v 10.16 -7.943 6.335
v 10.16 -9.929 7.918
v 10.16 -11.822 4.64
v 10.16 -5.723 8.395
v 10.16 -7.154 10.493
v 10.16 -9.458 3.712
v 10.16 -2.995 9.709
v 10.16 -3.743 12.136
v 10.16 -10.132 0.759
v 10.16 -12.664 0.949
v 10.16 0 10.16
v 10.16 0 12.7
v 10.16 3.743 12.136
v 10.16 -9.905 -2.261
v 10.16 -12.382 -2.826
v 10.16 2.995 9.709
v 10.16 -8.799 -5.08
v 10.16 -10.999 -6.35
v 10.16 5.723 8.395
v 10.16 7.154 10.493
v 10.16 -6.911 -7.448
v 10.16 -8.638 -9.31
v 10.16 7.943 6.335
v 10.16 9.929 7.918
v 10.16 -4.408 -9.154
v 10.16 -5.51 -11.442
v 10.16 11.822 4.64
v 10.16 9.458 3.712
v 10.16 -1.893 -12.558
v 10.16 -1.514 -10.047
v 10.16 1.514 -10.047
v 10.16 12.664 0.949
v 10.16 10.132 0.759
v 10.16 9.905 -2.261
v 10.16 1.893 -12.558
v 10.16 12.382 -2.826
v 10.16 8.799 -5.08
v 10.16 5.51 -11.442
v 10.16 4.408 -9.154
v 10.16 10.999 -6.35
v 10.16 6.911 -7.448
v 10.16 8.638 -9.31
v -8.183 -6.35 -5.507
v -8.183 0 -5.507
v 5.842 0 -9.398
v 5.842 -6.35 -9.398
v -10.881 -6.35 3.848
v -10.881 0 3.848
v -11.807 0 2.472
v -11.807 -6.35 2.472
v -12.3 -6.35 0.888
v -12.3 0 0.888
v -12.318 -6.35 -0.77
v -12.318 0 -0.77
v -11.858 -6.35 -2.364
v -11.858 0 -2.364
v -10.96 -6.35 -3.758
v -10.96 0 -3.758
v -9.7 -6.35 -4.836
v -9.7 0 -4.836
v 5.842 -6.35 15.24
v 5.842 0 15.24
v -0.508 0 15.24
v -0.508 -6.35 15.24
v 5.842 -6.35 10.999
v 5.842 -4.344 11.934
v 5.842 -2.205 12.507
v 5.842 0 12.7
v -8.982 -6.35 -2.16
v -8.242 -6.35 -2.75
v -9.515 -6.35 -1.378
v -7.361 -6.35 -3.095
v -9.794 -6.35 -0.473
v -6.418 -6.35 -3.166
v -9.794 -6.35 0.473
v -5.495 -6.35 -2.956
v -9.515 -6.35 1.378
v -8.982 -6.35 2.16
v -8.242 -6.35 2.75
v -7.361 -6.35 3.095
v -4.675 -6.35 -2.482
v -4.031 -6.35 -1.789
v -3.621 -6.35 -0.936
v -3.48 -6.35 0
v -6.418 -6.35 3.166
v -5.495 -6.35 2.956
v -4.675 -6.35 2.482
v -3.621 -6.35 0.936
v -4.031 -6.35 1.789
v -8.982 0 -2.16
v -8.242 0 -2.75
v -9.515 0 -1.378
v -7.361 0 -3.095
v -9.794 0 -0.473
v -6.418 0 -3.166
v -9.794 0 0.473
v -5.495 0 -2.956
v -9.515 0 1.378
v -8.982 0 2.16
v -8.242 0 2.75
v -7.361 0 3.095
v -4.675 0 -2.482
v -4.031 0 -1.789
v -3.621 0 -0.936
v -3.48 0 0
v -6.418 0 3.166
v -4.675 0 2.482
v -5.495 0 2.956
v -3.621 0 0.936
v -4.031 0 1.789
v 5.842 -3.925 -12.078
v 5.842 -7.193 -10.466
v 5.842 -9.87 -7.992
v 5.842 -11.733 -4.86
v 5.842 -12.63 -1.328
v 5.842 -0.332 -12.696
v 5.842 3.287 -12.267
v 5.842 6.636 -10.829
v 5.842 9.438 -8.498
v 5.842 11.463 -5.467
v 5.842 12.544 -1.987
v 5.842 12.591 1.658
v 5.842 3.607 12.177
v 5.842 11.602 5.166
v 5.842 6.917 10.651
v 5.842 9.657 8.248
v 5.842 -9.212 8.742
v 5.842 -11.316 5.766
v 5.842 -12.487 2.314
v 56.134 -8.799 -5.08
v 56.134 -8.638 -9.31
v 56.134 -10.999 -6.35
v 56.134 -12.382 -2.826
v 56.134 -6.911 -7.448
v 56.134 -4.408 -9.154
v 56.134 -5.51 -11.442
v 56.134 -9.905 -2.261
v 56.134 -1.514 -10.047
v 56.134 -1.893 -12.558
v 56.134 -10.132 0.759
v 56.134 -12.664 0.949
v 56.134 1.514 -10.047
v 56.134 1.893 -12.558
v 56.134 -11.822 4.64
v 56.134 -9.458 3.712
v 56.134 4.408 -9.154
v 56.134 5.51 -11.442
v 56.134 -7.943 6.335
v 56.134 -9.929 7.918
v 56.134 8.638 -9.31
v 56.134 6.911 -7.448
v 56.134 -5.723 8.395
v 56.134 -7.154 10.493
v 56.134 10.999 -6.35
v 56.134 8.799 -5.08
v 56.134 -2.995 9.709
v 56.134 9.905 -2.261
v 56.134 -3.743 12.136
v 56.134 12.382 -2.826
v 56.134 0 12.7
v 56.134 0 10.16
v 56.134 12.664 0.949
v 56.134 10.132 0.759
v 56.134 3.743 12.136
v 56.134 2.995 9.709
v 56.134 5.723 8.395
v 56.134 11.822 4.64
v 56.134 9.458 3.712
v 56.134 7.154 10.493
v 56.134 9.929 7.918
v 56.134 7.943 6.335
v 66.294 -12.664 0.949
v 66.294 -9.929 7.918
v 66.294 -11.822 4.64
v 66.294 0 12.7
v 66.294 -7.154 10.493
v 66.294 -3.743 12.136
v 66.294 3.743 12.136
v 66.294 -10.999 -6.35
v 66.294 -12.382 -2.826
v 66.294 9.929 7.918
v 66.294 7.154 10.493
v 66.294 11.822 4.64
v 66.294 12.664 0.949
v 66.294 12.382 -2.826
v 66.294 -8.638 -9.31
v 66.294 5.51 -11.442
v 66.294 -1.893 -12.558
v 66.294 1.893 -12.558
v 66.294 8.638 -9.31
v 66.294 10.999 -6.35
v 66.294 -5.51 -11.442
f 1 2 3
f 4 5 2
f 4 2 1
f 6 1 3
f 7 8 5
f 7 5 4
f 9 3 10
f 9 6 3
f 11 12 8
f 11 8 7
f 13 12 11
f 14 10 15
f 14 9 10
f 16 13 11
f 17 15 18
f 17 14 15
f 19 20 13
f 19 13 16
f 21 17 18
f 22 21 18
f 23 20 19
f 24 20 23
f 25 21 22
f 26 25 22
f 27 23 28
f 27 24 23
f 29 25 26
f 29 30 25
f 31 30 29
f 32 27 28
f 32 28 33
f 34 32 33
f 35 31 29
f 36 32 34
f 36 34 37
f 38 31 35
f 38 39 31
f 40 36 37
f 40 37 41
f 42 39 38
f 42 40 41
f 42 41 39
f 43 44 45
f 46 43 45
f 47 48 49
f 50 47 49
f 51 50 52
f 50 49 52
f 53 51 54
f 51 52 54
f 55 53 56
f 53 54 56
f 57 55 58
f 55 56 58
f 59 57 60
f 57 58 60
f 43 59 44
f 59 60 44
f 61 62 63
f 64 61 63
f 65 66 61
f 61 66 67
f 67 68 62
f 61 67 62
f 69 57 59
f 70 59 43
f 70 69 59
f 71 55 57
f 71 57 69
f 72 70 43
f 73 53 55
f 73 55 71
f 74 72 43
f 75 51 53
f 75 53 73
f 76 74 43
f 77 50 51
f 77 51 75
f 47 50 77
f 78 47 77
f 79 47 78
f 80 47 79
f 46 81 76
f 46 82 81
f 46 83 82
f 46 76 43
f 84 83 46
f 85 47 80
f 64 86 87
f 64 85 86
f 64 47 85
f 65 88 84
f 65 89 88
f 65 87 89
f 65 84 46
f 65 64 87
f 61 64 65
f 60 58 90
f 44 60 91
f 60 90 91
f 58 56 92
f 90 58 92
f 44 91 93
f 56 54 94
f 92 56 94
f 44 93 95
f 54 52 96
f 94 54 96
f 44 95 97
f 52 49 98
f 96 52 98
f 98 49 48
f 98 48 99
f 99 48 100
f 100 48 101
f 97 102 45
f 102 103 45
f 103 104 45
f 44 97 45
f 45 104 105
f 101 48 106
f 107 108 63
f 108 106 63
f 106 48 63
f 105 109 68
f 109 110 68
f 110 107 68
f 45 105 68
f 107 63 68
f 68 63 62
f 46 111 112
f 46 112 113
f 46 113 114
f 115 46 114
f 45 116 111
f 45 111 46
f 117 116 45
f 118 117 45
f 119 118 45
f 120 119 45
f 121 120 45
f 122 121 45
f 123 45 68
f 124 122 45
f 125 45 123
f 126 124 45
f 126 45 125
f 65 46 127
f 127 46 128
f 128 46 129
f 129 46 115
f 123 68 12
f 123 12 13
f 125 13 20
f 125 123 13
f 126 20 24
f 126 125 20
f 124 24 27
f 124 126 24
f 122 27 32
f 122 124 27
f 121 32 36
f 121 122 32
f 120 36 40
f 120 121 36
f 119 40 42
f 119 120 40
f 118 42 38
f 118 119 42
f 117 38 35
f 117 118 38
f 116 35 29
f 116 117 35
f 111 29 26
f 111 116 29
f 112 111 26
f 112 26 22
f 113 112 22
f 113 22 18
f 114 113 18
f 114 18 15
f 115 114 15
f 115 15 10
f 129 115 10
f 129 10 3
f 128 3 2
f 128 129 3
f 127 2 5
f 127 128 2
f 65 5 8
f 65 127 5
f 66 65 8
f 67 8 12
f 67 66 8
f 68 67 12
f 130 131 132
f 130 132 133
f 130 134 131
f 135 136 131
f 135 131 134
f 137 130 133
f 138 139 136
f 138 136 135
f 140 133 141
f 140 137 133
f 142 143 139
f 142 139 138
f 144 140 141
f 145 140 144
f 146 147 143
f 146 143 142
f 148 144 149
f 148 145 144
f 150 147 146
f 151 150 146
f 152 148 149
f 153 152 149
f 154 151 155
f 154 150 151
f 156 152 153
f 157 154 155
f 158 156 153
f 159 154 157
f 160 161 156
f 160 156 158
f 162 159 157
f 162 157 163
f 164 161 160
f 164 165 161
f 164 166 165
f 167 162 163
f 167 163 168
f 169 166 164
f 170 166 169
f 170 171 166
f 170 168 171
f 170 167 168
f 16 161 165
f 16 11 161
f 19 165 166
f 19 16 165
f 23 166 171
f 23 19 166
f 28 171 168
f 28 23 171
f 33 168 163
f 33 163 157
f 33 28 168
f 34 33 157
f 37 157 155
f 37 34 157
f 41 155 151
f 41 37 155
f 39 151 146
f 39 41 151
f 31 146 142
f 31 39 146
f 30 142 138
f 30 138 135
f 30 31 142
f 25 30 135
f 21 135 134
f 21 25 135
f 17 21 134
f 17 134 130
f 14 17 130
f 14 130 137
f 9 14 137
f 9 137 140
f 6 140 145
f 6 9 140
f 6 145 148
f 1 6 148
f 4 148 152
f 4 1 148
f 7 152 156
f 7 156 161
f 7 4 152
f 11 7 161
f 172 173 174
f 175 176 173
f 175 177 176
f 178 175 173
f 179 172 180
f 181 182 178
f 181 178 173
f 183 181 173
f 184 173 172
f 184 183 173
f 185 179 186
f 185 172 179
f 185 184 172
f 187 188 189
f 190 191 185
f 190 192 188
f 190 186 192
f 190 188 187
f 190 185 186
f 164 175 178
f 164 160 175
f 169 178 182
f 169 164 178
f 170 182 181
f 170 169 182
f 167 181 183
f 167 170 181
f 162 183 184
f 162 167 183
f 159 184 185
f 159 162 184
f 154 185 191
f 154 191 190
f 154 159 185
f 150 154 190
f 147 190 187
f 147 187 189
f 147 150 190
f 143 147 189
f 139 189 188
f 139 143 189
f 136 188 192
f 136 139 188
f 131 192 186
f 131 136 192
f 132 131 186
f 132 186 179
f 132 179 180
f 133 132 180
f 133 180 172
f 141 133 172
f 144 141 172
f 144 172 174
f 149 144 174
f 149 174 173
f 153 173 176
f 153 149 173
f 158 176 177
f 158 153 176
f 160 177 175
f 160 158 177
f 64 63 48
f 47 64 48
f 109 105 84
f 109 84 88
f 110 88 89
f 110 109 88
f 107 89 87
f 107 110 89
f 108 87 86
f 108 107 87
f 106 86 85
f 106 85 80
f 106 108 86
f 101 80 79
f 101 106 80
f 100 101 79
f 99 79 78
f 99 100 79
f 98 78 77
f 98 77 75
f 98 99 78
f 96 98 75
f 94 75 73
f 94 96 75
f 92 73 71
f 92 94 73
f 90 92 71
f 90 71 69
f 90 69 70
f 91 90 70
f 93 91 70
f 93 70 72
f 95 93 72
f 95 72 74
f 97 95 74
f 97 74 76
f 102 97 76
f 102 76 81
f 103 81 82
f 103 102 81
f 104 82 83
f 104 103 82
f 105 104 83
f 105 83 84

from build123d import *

# Parameters (mm, degrees)
F0_W     = 5.842
F0_H     = 12.7
F0_R     = 3.175
F2_DEPTH = 6.35


with BuildPart() as f1:
    # F0 (on Front) → F1 (revolve)
    with BuildSketch(Plane.XZ):
        Polygon((5.842, 12.7), (5.842, 0), (66.294, 0), (66.294, 12.7), (56.134, 12.7), (56.134, 10.16), (10.16, 10.16), (10.16, 12.7), align=None)
    revolve(axis=Axis((33.147, 0, 0), (-1, 0, 0)))

    # F0 (on Front) → F2 (join)
    with BuildSketch(Plane.XZ):
        with BuildLine():
            Line((-0.9398, 0), (0, 0))
            Line((0, 0), (0, 12.7))
            Line((0, 12.7), (5.842, 12.7))
            Line((5.842, 12.7), (5.842, 15.24))
            Line((5.842, 15.24), (-0.508, 15.24))
            Line((-0.508, 15.24), (-10.88063, 3.847543))
            ThreePointArc((-10.88063, 3.847543), (-4.591961, 5.329721), (-0.9398, 0))
        make_face()
        with Locations((2.921, 6.35)):
            Rectangle(F0_W, F0_H)
        with BuildLine():
            Line((5.842, 0), (0, 0))
            Line((0, 0), (-0.9398, 0))
            ThreePointArc((-0.9398, 0), (-3.195791, -4.549339), (-8.182663, -5.506983))
            Line((-8.182663, -5.506983), (5.842, -9.398))
            Line((5.842, -9.398), (5.842, 0))
        make_face()
        with BuildLine():
            ThreePointArc((-8.182663, -5.506983), (-3.195791, -4.549339), (-0.9398, 0))
            ThreePointArc((-0.9398, 0), (-4.591961, 5.329721), (-10.88063, 3.847543))
            ThreePointArc((-10.88063, 3.847543), (-12.145978, -1.583727), (-8.182663, -5.506983))
        make_face()
        with Locations((-6.6548, 0)):
            Circle(F0_R, mode=Mode.SUBTRACT)
    extrude(amount=F2_DEPTH)


solid = f1.part
